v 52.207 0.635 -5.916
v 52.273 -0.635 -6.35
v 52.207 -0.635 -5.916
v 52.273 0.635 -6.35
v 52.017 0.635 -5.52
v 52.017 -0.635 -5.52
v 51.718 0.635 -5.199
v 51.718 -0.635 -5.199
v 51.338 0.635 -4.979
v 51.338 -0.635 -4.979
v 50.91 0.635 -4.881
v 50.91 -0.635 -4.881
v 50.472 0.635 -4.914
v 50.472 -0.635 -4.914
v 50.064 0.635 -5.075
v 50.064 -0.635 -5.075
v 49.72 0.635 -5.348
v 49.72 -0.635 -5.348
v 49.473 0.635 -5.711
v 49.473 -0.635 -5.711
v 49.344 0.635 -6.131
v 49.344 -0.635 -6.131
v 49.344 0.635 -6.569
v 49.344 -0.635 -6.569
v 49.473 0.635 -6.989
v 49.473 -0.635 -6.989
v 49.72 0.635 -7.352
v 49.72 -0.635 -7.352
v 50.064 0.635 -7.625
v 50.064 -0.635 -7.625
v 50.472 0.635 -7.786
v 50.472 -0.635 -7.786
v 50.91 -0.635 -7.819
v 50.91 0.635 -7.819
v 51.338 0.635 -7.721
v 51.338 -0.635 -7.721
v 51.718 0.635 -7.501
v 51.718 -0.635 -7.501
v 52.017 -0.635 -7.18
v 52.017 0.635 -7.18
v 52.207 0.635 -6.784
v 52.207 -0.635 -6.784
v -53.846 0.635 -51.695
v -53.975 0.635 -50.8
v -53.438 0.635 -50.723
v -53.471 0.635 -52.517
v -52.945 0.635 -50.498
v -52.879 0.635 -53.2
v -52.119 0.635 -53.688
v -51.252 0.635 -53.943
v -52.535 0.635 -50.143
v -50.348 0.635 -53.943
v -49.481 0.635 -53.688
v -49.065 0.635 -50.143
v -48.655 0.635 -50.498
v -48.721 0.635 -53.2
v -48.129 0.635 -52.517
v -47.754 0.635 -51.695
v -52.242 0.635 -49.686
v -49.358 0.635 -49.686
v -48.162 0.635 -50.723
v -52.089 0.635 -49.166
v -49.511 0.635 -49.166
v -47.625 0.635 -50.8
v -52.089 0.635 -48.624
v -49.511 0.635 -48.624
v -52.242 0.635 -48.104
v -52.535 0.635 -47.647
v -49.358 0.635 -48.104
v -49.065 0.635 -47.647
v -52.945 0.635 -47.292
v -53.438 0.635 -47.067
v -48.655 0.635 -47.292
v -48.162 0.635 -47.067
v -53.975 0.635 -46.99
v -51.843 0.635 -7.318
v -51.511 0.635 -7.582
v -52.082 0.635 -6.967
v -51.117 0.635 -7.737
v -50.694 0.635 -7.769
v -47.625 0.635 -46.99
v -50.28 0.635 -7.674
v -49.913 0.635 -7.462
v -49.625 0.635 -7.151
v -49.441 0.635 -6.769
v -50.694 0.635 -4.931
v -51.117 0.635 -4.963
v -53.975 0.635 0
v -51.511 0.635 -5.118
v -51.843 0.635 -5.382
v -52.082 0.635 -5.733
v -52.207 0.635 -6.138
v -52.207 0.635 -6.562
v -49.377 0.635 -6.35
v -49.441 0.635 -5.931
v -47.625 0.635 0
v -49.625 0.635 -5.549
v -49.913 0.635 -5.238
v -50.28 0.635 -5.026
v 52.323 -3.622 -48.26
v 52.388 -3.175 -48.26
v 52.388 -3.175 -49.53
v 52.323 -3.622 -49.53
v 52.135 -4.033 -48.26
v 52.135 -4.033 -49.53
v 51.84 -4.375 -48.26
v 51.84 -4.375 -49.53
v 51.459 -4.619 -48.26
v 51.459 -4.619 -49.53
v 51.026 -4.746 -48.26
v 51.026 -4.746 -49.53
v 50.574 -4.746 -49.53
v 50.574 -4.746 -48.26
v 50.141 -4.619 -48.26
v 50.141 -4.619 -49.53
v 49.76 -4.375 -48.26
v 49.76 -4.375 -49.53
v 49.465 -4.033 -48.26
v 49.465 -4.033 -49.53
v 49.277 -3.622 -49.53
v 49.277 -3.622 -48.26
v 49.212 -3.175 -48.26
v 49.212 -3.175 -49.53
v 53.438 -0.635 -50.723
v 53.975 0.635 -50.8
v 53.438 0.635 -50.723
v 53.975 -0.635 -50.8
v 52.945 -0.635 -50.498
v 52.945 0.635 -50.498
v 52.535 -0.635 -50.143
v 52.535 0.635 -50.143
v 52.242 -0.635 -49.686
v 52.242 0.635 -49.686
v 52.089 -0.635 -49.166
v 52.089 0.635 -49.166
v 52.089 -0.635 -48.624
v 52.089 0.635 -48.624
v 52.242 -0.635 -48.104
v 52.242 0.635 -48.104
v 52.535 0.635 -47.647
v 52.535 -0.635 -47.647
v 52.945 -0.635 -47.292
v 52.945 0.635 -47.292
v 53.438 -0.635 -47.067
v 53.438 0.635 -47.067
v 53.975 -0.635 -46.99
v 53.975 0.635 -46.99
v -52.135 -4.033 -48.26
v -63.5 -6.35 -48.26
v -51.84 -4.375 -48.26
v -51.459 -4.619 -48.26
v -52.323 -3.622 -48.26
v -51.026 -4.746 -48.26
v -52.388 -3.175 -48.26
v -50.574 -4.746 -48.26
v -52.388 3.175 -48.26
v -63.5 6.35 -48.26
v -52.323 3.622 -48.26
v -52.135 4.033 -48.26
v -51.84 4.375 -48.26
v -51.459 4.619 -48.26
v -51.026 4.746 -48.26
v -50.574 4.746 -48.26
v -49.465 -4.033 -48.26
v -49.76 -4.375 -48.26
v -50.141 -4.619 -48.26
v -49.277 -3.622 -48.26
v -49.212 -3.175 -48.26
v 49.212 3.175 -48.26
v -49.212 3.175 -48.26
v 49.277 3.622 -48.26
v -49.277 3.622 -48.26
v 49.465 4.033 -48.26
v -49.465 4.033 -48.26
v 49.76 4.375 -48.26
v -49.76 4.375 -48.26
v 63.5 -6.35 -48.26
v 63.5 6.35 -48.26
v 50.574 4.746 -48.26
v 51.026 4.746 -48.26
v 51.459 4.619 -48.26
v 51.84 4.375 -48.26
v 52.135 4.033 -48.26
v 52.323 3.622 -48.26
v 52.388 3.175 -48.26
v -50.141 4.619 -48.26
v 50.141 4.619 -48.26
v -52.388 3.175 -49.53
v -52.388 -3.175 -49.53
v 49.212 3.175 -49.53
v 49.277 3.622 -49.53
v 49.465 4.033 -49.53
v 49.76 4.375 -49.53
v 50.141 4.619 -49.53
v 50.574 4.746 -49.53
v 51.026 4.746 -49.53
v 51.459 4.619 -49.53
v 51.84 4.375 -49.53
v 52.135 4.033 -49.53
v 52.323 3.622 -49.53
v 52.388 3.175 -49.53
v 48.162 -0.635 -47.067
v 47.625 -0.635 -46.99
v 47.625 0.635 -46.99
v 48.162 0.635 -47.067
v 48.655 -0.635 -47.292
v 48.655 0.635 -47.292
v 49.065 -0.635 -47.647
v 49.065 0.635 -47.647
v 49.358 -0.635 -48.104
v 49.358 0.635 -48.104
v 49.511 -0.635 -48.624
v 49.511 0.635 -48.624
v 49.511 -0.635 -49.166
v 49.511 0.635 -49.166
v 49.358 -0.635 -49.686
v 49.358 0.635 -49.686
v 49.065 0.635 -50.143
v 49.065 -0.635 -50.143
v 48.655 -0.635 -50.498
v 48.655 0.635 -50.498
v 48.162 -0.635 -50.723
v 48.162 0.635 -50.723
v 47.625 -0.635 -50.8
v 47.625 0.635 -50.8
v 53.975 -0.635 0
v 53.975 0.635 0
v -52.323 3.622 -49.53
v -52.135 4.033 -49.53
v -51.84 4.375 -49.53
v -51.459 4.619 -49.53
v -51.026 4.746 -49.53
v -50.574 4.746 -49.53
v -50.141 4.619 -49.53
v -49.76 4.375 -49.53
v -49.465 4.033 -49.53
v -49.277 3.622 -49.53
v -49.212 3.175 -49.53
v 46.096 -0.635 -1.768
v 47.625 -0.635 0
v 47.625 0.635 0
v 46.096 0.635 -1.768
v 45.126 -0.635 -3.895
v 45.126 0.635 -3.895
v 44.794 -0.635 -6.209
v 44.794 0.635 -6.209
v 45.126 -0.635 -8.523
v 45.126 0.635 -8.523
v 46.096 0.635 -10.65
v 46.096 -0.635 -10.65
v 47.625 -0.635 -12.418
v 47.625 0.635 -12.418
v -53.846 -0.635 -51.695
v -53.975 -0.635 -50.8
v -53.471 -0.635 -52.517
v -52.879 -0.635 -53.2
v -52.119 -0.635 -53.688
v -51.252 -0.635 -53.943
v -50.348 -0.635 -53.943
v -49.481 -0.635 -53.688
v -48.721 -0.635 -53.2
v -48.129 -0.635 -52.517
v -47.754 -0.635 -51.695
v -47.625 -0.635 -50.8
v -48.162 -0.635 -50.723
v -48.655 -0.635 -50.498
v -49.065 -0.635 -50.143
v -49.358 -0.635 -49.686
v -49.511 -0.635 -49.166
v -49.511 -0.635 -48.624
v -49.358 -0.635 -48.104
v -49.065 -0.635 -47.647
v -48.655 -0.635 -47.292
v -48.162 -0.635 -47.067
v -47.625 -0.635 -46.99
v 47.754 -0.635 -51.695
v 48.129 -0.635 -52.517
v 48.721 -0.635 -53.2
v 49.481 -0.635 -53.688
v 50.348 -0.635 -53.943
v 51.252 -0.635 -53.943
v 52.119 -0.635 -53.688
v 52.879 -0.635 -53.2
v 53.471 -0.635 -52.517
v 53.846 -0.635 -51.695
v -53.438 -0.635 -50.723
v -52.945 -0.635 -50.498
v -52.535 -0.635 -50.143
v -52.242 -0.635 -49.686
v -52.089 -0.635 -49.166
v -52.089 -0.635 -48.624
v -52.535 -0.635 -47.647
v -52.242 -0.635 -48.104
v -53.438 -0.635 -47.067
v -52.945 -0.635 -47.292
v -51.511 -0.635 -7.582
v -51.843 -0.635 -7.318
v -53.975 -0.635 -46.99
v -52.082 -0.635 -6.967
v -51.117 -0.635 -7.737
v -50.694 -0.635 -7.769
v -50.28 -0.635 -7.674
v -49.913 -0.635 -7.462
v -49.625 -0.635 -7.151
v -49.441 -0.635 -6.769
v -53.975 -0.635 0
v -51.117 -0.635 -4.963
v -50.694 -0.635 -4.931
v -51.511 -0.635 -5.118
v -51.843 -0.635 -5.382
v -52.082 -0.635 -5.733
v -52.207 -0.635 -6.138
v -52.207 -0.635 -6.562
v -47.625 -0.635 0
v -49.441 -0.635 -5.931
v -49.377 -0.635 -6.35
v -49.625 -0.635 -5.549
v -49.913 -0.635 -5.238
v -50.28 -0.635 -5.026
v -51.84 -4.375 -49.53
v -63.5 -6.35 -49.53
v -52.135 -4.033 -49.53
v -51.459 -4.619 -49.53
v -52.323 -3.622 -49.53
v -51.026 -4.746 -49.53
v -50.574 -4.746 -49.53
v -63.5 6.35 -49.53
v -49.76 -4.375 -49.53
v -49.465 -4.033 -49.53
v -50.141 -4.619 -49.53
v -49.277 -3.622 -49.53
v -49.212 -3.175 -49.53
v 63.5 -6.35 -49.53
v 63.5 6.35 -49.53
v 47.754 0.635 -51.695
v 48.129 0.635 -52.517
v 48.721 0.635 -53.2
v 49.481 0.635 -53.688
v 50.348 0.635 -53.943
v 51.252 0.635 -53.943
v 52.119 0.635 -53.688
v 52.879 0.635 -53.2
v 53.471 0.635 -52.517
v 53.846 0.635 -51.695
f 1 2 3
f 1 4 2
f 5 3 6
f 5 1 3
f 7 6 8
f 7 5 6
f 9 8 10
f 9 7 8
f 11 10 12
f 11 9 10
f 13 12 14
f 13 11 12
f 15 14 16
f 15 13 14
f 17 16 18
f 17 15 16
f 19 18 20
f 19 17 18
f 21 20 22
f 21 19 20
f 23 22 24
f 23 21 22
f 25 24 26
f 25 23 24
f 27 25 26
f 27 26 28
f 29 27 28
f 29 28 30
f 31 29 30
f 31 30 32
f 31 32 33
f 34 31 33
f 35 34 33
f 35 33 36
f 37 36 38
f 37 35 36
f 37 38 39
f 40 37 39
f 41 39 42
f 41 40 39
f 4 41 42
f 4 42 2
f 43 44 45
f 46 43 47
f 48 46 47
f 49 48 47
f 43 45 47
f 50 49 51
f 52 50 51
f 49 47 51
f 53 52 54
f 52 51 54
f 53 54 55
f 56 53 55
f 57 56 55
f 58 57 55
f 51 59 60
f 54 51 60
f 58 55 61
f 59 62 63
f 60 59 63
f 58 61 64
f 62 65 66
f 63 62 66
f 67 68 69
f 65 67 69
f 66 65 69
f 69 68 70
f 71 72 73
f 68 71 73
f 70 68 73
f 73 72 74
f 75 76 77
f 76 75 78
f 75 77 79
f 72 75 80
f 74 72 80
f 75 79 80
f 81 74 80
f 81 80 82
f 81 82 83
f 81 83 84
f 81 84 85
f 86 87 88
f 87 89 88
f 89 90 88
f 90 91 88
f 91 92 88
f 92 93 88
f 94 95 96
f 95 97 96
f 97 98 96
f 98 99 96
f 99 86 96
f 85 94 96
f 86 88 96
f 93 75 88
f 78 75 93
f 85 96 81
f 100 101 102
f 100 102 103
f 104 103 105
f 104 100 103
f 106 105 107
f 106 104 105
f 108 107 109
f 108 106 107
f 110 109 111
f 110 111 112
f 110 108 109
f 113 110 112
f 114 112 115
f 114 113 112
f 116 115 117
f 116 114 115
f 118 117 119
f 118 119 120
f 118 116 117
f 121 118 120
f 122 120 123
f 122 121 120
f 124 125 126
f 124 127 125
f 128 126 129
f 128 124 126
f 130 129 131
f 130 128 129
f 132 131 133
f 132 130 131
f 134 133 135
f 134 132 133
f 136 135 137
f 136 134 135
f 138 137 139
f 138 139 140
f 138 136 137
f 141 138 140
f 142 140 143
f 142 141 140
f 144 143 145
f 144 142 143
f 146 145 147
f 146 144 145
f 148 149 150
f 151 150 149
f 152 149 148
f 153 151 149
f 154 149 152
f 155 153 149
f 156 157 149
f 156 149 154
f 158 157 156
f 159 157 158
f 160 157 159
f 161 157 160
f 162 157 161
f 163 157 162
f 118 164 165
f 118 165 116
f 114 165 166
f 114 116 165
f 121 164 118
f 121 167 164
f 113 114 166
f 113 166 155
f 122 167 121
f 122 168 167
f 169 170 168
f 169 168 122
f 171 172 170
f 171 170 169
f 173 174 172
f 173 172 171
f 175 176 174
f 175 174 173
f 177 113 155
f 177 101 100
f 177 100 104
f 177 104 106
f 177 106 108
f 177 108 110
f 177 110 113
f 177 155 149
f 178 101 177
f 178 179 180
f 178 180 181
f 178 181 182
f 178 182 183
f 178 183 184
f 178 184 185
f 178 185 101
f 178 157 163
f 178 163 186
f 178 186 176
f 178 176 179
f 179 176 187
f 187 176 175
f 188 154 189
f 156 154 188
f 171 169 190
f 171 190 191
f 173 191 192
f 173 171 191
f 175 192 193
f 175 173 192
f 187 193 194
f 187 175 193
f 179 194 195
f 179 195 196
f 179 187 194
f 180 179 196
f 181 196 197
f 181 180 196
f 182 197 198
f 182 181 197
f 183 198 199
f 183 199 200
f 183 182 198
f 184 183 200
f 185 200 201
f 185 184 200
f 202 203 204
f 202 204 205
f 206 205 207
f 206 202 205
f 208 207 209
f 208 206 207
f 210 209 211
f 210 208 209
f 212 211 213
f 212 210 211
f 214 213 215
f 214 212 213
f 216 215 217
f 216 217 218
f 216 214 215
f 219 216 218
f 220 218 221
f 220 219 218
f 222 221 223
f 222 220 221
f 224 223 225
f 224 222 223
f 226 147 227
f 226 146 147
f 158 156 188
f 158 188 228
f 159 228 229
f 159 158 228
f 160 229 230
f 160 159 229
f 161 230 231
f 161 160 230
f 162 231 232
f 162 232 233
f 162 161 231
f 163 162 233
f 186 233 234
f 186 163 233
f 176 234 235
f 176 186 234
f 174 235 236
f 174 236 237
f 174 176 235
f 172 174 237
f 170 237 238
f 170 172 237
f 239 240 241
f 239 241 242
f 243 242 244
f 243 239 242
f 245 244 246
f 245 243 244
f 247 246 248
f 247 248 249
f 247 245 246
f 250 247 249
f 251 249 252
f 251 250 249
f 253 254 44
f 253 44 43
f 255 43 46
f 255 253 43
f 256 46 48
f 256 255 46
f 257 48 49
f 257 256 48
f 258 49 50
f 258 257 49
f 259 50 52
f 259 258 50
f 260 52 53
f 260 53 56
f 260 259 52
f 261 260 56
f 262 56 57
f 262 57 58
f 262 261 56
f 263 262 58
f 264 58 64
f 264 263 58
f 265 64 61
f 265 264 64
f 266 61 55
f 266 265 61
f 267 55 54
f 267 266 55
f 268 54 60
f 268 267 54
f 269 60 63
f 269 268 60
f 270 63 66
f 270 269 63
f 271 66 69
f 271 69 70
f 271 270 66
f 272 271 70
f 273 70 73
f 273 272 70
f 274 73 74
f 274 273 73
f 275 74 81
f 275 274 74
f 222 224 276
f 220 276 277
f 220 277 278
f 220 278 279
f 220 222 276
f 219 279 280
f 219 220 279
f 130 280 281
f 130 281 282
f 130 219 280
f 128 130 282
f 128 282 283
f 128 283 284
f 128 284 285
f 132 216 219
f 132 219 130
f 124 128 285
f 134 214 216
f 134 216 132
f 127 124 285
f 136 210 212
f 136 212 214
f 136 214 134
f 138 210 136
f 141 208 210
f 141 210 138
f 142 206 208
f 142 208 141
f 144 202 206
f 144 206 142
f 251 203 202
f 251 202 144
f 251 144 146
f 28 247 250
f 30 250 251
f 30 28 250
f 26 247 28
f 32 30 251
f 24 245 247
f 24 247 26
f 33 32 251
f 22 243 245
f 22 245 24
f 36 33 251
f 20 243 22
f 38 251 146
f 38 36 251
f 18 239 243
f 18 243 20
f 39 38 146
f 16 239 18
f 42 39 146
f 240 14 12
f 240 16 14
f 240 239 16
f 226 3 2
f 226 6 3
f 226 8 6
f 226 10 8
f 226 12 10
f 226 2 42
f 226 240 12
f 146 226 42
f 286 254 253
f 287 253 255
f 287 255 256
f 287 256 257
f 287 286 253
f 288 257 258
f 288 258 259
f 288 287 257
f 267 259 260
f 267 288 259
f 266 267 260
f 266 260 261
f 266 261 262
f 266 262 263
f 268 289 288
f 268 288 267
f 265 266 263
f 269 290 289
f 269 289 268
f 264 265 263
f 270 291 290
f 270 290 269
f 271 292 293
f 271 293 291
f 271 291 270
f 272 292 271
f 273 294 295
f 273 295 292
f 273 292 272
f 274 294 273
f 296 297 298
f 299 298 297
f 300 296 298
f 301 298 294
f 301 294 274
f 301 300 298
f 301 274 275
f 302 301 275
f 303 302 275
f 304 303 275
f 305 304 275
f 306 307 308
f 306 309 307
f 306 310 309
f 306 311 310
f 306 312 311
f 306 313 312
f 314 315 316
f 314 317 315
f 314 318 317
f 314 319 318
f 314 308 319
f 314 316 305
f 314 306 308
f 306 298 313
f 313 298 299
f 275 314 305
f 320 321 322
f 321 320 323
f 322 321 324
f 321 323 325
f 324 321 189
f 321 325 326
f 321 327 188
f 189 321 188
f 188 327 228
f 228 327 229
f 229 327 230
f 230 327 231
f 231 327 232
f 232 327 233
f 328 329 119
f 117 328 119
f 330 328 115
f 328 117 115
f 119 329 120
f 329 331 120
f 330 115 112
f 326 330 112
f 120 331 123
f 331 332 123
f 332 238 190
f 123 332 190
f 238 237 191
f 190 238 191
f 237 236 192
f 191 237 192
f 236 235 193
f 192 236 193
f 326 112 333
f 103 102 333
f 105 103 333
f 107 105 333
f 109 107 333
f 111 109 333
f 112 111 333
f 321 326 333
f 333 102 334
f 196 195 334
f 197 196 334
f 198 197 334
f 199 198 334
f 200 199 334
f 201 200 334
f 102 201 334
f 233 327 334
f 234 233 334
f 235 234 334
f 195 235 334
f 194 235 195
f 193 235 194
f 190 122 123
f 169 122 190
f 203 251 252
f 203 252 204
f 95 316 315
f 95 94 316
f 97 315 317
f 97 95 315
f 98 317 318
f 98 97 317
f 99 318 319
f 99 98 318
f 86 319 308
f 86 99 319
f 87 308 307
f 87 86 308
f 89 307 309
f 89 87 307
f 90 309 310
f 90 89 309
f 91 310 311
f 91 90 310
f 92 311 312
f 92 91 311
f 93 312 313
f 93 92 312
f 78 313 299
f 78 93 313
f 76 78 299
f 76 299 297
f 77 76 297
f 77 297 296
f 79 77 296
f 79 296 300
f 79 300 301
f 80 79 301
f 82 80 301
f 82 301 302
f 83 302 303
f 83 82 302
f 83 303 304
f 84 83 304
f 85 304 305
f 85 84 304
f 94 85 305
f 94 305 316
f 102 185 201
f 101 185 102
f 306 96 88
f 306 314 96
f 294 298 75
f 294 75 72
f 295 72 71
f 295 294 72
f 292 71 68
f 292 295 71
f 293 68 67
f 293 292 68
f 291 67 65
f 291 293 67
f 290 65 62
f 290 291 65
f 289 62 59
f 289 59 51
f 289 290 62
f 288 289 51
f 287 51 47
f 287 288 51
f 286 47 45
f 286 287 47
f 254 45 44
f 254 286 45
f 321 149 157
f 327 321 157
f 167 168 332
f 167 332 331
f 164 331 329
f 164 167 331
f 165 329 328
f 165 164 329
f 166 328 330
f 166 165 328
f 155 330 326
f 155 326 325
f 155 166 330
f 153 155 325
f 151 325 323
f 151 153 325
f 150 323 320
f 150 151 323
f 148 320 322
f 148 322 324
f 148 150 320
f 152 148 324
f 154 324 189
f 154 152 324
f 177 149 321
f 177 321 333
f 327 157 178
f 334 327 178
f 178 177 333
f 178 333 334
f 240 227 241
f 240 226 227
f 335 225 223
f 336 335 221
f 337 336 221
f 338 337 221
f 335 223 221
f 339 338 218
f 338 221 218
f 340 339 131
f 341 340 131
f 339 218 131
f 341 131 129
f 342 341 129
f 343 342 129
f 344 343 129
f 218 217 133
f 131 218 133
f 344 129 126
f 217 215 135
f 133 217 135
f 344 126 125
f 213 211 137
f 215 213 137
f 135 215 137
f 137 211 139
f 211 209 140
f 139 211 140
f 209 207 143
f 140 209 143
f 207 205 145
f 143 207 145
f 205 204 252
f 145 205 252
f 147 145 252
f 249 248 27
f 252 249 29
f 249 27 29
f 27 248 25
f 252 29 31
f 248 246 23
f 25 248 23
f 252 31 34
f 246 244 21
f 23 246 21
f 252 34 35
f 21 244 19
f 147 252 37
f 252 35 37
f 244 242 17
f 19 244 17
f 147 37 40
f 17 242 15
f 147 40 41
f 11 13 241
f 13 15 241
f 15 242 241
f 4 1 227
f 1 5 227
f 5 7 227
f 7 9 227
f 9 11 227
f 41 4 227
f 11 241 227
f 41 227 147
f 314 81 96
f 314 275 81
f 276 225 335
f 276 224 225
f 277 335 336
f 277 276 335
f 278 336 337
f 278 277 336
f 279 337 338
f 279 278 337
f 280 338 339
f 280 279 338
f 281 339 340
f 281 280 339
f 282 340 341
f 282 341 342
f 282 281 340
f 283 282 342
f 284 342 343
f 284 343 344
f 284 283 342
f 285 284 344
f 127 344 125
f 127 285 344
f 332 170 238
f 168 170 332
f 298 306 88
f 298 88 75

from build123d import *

# Parameters (mm, degrees)
F0_R     = 1.4226150659
F1_DEPTH = 0.635
F3_START = -48.26
F2_W     = 127
F2_H     = 12.7
F3_DEPTH = 1.27
F0_R_2   = 1.4727322888
F4_DEPTH = 0.635


with BuildPart() as f1:
    # F0 (on Front) → F1 (new body, symmetric)
    with BuildSketch(Plane.XZ):
        with BuildLine():
            Line((-47.625, 0), (-53.975, 0))
            Line((-53.975, 0), (-53.975, -46.99))
            ThreePointArc((-53.975, -46.99), (-52.07, -48.895), (-53.975, -50.8))
            ThreePointArc((-53.975, -50.8), (-50.8, -53.975), (-47.625, -50.8))
            ThreePointArc((-47.625, -50.8), (-49.53, -48.895), (-47.625, -46.99))
            Line((-47.625, -46.99), (-47.625, 0))
        make_face()
        with Locations((-50.8, -6.35)):
            Circle(F0_R, mode=Mode.SUBTRACT)
    extrude(amount=F1_DEPTH, both=True)


with BuildPart() as f3:
    # F2 (on Top) → F3 (new body)
    with BuildSketch(Plane.XY.offset(F3_START)):
        Rectangle(F2_W, F2_H)
        with BuildLine():
            Line((-49.2125, 3.175), (-49.2125, -3.175))
            ThreePointArc((-49.2125, -3.175), (-50.8, -4.7625), (-52.3875, -3.175))
            Line((-52.3875, -3.175), (-52.3875, 3.175))
            ThreePointArc((-52.3875, 3.175), (-50.8, 4.7625), (-49.2125, 3.175))
        make_face(mode=Mode.SUBTRACT)
        with BuildLine():
            ThreePointArc((49.2125, 3.175), (50.8, 4.7625), (52.3875, 3.175))
            Line((52.3875, 3.175), (52.3875, -3.175))
            ThreePointArc((52.3875, -3.175), (50.8, -4.7625), (49.2125, -3.175))
            Line((49.2125, -3.175), (49.2125, 3.175))
        make_face(mode=Mode.SUBTRACT)
    extrude(amount=-F3_DEPTH)


with BuildPart() as f4:
    # F0 (on Front) → F4 (new body, symmetric)
    with BuildSketch(Plane.XZ):
        with BuildLine():
            Line((53.975, 0), (47.625, 0))
            ThreePointArc((47.625, 0), (44.7936039156, -6.2090680003), (47.625, -12.4181360006))
            Line((47.625, -12.4181360006), (47.625, -46.99))
            ThreePointArc((47.625, -46.99), (49.53, -48.895), (47.625, -50.8))
            ThreePointArc((47.625, -50.8), (50.8, -53.975), (53.975, -50.8))
            ThreePointArc((53.975, -50.8), (52.07, -48.895), (53.975, -46.99))
            Line((53.975, -46.99), (53.975, 0))
        make_face()
        with Locations((50.8, -6.35)):
            Circle(F0_R_2, mode=Mode.SUBTRACT)
    extrude(amount=F4_DEPTH, both=True)


solid = Compound([f1.part, f3.part, f4.part])
